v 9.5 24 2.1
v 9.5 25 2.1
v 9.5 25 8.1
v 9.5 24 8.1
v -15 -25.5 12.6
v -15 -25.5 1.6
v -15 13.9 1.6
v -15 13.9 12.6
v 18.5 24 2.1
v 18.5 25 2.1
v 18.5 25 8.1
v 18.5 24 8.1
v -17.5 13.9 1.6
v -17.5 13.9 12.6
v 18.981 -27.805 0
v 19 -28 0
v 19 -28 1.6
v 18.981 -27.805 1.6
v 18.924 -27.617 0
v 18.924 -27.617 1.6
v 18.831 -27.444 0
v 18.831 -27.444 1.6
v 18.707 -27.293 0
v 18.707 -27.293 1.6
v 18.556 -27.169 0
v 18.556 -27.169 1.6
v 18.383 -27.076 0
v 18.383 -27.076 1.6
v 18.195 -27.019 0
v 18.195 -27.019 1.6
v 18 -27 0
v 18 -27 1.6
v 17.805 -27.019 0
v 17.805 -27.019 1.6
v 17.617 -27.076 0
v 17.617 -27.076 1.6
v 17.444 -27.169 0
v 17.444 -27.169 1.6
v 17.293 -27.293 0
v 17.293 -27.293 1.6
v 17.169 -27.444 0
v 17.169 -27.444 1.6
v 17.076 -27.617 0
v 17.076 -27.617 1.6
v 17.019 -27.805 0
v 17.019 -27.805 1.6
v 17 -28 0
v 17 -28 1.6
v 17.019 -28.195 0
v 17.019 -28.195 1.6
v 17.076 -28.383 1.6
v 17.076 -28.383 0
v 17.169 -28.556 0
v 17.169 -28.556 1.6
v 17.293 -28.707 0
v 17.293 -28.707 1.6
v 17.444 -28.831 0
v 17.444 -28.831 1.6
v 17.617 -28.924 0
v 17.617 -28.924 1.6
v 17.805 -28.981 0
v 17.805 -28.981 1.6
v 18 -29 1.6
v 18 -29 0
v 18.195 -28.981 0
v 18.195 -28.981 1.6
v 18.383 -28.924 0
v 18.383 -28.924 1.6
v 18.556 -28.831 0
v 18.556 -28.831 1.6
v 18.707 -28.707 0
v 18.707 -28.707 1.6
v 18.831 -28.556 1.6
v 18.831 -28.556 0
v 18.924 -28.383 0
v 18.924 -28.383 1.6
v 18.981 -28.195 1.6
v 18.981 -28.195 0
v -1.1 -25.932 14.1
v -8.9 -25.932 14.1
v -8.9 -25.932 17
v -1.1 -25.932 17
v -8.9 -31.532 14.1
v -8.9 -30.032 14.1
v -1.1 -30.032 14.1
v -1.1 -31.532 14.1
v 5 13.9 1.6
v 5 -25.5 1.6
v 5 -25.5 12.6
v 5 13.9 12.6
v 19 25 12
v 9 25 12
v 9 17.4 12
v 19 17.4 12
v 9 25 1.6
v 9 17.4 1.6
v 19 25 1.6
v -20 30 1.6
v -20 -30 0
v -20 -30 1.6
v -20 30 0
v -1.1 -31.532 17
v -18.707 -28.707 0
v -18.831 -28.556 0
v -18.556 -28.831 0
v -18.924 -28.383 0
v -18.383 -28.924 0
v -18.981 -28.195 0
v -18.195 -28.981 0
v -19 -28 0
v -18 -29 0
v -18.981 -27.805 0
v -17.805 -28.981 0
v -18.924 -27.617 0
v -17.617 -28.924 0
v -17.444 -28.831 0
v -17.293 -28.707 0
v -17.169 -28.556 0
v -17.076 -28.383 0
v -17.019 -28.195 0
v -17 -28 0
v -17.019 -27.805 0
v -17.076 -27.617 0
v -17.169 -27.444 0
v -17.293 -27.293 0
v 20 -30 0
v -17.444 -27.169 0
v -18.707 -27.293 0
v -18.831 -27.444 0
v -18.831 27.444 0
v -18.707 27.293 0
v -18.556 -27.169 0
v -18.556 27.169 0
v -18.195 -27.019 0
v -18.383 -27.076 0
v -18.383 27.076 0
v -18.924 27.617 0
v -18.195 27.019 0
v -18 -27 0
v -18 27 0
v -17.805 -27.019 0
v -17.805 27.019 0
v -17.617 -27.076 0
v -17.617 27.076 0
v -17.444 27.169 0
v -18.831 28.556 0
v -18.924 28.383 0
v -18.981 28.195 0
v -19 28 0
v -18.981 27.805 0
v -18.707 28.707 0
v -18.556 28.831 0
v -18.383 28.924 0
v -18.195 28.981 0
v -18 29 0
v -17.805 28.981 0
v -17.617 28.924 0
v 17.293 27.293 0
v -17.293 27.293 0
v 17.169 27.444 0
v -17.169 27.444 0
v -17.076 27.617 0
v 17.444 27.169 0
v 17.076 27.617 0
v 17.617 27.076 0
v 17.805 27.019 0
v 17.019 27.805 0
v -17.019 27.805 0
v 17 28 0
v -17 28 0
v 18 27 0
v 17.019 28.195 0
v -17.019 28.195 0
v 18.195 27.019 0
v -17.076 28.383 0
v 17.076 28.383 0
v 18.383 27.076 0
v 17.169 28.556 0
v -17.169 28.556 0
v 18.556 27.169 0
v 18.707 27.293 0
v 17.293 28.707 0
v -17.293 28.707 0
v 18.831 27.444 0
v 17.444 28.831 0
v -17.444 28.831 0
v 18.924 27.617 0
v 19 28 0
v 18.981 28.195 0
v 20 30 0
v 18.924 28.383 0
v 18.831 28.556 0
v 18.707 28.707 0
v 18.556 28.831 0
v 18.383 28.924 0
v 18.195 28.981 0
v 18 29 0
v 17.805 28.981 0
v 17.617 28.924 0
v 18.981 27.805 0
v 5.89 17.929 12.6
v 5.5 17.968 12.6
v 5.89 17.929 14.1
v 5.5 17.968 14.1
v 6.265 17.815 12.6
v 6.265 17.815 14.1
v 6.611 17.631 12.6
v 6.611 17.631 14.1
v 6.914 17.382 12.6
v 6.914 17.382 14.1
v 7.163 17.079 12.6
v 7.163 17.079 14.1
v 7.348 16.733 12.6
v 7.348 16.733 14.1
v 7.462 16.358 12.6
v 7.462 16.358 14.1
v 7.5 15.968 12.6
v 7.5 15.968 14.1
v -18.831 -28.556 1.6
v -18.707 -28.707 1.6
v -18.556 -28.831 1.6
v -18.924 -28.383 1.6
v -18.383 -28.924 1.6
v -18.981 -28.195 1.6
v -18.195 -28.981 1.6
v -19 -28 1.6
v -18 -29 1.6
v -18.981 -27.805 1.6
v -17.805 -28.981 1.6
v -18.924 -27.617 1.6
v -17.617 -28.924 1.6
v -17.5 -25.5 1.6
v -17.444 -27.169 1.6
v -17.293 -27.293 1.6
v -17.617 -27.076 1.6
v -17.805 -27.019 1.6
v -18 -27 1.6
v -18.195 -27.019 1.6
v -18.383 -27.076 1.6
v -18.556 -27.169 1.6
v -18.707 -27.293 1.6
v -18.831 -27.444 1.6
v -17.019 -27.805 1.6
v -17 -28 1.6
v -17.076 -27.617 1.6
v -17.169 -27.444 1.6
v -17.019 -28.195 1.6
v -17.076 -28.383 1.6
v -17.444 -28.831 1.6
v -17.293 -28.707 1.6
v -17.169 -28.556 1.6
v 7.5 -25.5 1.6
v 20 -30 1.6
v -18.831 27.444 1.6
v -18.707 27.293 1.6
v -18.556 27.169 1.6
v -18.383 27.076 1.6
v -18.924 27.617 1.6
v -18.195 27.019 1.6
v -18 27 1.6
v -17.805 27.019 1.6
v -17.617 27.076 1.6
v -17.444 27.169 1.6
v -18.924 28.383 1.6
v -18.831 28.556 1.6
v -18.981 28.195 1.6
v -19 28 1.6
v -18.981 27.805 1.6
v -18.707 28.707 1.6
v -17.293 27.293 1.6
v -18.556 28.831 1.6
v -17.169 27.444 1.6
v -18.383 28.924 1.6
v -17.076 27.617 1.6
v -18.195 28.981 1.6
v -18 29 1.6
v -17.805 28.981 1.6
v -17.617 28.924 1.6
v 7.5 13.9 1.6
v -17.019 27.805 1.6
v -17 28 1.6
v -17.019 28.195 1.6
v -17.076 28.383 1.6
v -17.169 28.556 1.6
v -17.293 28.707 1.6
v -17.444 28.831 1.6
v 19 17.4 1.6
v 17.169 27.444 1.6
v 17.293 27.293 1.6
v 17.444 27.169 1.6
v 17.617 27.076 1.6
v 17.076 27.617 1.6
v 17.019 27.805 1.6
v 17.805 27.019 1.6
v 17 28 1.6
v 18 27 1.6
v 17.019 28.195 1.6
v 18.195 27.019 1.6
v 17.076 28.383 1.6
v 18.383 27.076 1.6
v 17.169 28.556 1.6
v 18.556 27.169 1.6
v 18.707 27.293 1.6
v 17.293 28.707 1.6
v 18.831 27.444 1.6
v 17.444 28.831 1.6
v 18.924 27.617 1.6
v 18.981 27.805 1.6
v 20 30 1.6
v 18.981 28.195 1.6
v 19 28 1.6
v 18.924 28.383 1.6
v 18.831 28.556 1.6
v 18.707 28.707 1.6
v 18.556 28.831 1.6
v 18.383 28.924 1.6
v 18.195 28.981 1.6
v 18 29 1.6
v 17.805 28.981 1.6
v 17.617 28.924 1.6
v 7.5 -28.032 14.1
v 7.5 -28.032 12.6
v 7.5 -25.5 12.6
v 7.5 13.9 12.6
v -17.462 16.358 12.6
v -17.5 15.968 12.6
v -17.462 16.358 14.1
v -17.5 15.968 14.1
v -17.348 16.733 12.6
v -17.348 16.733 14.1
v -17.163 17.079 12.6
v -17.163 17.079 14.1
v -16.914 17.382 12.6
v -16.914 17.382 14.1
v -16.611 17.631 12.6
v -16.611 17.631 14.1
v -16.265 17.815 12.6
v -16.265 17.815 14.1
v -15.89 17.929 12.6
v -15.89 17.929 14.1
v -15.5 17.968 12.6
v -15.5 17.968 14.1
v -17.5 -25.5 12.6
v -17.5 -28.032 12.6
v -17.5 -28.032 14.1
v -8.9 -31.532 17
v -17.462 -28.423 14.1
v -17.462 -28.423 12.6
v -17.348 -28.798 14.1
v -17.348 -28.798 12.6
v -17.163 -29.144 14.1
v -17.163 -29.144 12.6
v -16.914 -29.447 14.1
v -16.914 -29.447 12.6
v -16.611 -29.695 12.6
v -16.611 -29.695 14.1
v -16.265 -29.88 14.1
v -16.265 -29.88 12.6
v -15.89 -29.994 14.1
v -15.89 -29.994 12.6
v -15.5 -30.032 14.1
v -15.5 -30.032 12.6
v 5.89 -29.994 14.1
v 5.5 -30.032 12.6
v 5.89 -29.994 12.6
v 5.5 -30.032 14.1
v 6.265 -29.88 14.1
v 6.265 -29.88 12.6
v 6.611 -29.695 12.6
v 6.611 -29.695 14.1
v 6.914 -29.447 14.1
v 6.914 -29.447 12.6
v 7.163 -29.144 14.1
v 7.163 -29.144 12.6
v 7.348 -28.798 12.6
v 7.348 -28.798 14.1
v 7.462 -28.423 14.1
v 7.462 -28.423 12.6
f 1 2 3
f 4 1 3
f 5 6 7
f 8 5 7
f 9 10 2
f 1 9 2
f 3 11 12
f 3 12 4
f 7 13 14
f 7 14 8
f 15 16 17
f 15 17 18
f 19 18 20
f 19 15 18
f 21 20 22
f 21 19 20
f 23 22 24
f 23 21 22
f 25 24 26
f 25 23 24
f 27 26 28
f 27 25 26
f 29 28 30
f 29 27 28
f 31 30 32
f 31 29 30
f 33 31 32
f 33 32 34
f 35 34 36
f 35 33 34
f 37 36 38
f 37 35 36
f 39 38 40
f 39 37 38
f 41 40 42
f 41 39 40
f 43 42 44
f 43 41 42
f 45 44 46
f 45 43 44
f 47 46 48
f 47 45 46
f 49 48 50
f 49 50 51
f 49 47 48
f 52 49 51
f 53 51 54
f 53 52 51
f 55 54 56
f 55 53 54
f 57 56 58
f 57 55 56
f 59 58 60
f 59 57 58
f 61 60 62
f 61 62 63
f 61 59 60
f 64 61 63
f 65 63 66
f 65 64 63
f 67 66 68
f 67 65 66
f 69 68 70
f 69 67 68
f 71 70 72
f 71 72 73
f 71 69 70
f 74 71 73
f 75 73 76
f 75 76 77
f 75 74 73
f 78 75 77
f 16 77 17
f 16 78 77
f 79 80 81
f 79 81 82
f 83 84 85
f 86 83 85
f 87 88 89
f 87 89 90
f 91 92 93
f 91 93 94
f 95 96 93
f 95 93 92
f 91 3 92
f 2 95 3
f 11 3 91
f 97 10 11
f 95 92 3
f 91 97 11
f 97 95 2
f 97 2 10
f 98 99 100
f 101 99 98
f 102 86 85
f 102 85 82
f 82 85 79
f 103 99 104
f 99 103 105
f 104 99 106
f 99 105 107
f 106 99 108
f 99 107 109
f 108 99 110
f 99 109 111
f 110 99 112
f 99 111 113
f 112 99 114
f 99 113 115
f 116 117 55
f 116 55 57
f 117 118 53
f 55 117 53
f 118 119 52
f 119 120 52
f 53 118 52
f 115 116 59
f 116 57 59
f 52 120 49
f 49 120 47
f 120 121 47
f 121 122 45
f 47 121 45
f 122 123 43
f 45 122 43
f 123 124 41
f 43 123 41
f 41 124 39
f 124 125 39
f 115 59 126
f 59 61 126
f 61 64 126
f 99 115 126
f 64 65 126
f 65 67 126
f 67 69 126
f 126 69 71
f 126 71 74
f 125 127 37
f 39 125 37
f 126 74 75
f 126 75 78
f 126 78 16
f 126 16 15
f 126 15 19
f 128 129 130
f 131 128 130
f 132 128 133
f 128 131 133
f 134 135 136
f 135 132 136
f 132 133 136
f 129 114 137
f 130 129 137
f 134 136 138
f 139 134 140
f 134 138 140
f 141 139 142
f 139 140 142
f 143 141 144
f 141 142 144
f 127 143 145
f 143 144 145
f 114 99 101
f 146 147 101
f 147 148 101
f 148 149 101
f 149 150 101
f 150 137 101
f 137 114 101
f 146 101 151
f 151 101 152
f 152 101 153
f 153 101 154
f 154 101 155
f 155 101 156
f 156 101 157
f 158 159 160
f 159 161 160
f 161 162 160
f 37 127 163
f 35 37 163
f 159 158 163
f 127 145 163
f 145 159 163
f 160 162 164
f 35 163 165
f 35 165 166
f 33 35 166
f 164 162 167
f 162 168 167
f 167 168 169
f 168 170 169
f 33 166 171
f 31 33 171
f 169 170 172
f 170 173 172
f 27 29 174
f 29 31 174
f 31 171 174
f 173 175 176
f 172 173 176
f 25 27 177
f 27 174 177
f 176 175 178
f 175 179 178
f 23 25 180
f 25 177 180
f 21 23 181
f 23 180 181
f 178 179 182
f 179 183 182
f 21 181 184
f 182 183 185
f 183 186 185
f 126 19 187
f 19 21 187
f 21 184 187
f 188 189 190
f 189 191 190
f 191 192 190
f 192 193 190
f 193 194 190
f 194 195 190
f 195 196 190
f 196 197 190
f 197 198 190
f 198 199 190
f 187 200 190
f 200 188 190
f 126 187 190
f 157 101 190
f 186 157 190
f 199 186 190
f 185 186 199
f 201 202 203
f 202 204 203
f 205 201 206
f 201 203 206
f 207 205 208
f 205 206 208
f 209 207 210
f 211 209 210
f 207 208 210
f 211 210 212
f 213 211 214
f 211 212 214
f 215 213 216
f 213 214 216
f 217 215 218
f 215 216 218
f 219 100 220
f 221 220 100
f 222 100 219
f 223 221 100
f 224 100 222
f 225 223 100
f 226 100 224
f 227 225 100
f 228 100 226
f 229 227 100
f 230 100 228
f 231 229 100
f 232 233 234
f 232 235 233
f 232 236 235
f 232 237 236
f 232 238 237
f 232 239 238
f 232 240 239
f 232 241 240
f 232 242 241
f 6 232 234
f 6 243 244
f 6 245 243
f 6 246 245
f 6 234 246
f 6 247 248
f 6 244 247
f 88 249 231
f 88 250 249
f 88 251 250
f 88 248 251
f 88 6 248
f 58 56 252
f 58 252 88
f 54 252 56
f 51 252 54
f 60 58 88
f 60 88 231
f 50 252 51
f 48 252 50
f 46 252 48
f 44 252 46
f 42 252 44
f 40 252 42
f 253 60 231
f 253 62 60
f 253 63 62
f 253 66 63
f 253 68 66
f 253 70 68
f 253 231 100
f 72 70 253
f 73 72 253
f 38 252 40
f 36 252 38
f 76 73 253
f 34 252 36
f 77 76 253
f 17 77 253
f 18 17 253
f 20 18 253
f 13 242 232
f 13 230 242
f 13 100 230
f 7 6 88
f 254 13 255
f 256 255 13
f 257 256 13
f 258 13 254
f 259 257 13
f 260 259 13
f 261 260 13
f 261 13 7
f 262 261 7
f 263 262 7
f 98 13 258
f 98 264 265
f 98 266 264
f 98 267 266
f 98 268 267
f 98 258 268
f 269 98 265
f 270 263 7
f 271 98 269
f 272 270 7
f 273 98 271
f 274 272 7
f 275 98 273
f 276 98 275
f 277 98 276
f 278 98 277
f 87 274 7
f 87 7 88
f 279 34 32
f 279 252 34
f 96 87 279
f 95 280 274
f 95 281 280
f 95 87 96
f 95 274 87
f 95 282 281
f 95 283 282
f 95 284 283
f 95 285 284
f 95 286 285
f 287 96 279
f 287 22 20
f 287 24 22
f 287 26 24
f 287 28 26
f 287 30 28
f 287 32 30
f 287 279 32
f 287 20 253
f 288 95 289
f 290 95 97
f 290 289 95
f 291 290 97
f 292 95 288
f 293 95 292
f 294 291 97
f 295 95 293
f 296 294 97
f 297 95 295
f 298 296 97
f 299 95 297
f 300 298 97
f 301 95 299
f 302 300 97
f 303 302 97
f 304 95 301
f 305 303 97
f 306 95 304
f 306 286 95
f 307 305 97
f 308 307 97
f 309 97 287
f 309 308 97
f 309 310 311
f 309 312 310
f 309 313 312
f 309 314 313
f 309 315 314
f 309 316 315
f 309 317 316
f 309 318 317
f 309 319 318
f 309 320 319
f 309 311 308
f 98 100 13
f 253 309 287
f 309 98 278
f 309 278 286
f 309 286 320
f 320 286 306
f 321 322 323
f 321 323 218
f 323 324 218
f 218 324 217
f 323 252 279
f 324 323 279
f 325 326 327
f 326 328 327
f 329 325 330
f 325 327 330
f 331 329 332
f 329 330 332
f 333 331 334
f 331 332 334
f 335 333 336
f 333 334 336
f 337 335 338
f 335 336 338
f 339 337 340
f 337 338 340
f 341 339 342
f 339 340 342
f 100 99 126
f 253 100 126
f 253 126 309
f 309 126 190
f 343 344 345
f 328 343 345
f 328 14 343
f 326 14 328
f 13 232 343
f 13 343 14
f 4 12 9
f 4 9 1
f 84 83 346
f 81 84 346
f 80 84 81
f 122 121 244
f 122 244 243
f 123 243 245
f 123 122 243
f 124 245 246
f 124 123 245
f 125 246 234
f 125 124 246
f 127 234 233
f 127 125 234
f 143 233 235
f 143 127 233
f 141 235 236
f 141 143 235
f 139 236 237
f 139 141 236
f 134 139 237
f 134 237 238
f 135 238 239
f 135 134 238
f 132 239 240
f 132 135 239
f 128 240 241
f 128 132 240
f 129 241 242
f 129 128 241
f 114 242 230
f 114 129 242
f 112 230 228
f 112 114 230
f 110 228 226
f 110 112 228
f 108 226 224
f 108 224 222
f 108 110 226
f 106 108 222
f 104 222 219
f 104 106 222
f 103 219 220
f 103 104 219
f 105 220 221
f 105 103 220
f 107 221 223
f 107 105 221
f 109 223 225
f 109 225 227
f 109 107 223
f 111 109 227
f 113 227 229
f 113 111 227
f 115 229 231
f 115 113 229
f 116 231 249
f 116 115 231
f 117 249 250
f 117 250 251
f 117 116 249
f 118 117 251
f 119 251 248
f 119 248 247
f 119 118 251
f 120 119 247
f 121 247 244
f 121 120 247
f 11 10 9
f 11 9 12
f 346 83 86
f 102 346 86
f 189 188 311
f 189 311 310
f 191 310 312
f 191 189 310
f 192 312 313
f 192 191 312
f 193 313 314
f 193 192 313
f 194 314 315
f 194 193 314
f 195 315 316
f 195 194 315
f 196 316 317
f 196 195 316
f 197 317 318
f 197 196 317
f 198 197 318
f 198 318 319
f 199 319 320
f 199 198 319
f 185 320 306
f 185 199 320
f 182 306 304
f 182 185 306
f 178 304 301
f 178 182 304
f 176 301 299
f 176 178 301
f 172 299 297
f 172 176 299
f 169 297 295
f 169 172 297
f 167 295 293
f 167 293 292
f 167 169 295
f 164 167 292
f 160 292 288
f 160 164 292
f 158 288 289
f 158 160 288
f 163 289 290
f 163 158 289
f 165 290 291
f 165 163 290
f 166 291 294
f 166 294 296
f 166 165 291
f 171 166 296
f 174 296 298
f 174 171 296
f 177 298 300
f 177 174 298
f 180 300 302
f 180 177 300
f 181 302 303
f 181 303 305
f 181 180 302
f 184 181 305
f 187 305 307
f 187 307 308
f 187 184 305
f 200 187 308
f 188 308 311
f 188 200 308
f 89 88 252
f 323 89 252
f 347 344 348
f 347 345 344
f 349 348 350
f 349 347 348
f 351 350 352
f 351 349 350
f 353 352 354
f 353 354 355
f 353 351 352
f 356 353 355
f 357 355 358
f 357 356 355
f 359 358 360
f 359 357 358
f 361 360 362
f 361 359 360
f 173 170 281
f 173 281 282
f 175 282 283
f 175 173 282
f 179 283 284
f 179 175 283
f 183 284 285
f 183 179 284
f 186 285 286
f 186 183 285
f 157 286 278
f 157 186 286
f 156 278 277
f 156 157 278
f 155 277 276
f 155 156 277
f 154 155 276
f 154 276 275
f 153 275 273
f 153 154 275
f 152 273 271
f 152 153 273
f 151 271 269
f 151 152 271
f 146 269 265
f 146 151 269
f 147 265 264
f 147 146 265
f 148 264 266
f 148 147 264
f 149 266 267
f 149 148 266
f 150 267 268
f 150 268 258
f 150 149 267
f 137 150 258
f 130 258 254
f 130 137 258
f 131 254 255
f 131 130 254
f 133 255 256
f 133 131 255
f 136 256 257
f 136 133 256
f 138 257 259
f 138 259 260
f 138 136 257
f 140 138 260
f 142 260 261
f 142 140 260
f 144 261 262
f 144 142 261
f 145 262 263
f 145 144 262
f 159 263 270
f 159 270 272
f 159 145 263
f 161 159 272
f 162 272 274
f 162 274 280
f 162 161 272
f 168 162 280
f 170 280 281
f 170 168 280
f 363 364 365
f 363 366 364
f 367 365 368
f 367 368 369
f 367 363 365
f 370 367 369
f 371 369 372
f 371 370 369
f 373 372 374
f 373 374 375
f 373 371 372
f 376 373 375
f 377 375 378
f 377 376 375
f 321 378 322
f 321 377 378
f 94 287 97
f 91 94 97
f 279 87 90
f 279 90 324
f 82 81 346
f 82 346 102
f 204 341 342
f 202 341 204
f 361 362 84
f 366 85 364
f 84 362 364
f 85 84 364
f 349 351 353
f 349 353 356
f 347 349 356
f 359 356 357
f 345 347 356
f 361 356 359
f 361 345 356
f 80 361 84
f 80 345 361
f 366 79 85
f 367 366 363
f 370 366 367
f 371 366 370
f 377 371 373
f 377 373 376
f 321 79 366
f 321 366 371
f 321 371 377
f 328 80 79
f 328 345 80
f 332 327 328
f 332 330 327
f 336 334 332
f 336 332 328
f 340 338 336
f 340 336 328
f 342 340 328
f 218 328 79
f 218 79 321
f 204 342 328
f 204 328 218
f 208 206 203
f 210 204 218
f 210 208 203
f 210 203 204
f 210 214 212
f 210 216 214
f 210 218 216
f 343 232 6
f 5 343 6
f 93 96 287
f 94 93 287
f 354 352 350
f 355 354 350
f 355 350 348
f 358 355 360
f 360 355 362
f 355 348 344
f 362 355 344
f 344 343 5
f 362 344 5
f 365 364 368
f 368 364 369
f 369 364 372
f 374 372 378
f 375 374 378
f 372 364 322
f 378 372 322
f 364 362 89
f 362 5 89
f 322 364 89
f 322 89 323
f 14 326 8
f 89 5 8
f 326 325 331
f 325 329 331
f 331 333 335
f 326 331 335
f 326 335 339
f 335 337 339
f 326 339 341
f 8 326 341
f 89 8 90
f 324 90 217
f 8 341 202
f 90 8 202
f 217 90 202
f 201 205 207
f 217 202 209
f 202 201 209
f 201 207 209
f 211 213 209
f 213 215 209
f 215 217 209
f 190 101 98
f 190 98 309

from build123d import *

# Parameters (mm, degrees)
F0_W      = 40
F0_H      = 60
F0_R      = 1
F1_DEPTH  = 1.6
F2_W      = 10
F2_H      = 7.6
F3_DEPTH  = 10.4
F4_W      = 9
F4_H      = 6
F5_DEPTH  = 1
F6_W      = 2.5
F6_H      = 39.4
F7_DEPTH  = 11
F8_W      = 25
F8_H      = 48
F9_DEPTH  = 1.5
F10_R     = 2
F11_W     = 7.8
F11_H     = 5.6
F12_DEPTH = 2.9


with BuildPart() as f1:
    # F0 (on Top) → F1 (new body)
    with BuildSketch(Plane.XY):
        Rectangle(F0_W, F0_H)
        with Locations((-18, -28)):
            Circle(F0_R, mode=Mode.SUBTRACT)
        with Locations((18, -28)):
            Circle(F0_R, mode=Mode.SUBTRACT)
        with Locations((-18, 28)):
            Circle(F0_R, mode=Mode.SUBTRACT)
        with Locations((18, 28)):
            Circle(F0_R, mode=Mode.SUBTRACT)
    extrude(amount=F1_DEPTH)

    # F2 (on face) → F3 (join)
    with BuildSketch(Plane.XY.offset(1.6)):
        with Locations((14, 21.2)):
            Rectangle(F2_W, F2_H)
    extrude(amount=F3_DEPTH)

    # F4 (on face) → F5 (cut)
    with BuildSketch(Plane(origin=(0, 25, 0), x_dir=(-1, 0, 0), z_dir=(0, 1, 0))):
        with Locations((-14, 5.1)):
            Rectangle(F4_W, F4_H)
    extrude(amount=-F5_DEPTH, mode=Mode.SUBTRACT)

    # F6 (on face) → F7 (join)
    with BuildSketch(Plane.XY.offset(1.6)):
        with Locations((6.25, -5.8)):
            Rectangle(F6_W, F6_H)
        with Locations((-16.25, -5.8)):
            Rectangle(F6_W, F6_H)
    extrude(amount=F7_DEPTH)

    # F8 (on face) → F9 (join)
    with BuildSketch(Plane.XY.offset(12.6)):
        with Locations((-5, -6.032404)):
            Rectangle(F8_W, F8_H)
    extrude(amount=F9_DEPTH)

    # F10
    f10_edges = [f1.edges().sort_by_distance(p)[0] for p in [
        (-17.5, -30.032404, 13.35),
        (7.5, -30.032404, 13.35),
        (7.5, 17.967596, 13.35),
        (-17.5, 17.967596, 13.35),
    ]]
    fillet(f10_edges, radius=F10_R)

    # F11 (on face) → F12 (join)
    with BuildSketch(Plane.XY.offset(14.1)):
        with Locations((-5, -28.732404)):
            Rectangle(F11_W, F11_H)
    extrude(amount=F12_DEPTH)


solid = f1.part
